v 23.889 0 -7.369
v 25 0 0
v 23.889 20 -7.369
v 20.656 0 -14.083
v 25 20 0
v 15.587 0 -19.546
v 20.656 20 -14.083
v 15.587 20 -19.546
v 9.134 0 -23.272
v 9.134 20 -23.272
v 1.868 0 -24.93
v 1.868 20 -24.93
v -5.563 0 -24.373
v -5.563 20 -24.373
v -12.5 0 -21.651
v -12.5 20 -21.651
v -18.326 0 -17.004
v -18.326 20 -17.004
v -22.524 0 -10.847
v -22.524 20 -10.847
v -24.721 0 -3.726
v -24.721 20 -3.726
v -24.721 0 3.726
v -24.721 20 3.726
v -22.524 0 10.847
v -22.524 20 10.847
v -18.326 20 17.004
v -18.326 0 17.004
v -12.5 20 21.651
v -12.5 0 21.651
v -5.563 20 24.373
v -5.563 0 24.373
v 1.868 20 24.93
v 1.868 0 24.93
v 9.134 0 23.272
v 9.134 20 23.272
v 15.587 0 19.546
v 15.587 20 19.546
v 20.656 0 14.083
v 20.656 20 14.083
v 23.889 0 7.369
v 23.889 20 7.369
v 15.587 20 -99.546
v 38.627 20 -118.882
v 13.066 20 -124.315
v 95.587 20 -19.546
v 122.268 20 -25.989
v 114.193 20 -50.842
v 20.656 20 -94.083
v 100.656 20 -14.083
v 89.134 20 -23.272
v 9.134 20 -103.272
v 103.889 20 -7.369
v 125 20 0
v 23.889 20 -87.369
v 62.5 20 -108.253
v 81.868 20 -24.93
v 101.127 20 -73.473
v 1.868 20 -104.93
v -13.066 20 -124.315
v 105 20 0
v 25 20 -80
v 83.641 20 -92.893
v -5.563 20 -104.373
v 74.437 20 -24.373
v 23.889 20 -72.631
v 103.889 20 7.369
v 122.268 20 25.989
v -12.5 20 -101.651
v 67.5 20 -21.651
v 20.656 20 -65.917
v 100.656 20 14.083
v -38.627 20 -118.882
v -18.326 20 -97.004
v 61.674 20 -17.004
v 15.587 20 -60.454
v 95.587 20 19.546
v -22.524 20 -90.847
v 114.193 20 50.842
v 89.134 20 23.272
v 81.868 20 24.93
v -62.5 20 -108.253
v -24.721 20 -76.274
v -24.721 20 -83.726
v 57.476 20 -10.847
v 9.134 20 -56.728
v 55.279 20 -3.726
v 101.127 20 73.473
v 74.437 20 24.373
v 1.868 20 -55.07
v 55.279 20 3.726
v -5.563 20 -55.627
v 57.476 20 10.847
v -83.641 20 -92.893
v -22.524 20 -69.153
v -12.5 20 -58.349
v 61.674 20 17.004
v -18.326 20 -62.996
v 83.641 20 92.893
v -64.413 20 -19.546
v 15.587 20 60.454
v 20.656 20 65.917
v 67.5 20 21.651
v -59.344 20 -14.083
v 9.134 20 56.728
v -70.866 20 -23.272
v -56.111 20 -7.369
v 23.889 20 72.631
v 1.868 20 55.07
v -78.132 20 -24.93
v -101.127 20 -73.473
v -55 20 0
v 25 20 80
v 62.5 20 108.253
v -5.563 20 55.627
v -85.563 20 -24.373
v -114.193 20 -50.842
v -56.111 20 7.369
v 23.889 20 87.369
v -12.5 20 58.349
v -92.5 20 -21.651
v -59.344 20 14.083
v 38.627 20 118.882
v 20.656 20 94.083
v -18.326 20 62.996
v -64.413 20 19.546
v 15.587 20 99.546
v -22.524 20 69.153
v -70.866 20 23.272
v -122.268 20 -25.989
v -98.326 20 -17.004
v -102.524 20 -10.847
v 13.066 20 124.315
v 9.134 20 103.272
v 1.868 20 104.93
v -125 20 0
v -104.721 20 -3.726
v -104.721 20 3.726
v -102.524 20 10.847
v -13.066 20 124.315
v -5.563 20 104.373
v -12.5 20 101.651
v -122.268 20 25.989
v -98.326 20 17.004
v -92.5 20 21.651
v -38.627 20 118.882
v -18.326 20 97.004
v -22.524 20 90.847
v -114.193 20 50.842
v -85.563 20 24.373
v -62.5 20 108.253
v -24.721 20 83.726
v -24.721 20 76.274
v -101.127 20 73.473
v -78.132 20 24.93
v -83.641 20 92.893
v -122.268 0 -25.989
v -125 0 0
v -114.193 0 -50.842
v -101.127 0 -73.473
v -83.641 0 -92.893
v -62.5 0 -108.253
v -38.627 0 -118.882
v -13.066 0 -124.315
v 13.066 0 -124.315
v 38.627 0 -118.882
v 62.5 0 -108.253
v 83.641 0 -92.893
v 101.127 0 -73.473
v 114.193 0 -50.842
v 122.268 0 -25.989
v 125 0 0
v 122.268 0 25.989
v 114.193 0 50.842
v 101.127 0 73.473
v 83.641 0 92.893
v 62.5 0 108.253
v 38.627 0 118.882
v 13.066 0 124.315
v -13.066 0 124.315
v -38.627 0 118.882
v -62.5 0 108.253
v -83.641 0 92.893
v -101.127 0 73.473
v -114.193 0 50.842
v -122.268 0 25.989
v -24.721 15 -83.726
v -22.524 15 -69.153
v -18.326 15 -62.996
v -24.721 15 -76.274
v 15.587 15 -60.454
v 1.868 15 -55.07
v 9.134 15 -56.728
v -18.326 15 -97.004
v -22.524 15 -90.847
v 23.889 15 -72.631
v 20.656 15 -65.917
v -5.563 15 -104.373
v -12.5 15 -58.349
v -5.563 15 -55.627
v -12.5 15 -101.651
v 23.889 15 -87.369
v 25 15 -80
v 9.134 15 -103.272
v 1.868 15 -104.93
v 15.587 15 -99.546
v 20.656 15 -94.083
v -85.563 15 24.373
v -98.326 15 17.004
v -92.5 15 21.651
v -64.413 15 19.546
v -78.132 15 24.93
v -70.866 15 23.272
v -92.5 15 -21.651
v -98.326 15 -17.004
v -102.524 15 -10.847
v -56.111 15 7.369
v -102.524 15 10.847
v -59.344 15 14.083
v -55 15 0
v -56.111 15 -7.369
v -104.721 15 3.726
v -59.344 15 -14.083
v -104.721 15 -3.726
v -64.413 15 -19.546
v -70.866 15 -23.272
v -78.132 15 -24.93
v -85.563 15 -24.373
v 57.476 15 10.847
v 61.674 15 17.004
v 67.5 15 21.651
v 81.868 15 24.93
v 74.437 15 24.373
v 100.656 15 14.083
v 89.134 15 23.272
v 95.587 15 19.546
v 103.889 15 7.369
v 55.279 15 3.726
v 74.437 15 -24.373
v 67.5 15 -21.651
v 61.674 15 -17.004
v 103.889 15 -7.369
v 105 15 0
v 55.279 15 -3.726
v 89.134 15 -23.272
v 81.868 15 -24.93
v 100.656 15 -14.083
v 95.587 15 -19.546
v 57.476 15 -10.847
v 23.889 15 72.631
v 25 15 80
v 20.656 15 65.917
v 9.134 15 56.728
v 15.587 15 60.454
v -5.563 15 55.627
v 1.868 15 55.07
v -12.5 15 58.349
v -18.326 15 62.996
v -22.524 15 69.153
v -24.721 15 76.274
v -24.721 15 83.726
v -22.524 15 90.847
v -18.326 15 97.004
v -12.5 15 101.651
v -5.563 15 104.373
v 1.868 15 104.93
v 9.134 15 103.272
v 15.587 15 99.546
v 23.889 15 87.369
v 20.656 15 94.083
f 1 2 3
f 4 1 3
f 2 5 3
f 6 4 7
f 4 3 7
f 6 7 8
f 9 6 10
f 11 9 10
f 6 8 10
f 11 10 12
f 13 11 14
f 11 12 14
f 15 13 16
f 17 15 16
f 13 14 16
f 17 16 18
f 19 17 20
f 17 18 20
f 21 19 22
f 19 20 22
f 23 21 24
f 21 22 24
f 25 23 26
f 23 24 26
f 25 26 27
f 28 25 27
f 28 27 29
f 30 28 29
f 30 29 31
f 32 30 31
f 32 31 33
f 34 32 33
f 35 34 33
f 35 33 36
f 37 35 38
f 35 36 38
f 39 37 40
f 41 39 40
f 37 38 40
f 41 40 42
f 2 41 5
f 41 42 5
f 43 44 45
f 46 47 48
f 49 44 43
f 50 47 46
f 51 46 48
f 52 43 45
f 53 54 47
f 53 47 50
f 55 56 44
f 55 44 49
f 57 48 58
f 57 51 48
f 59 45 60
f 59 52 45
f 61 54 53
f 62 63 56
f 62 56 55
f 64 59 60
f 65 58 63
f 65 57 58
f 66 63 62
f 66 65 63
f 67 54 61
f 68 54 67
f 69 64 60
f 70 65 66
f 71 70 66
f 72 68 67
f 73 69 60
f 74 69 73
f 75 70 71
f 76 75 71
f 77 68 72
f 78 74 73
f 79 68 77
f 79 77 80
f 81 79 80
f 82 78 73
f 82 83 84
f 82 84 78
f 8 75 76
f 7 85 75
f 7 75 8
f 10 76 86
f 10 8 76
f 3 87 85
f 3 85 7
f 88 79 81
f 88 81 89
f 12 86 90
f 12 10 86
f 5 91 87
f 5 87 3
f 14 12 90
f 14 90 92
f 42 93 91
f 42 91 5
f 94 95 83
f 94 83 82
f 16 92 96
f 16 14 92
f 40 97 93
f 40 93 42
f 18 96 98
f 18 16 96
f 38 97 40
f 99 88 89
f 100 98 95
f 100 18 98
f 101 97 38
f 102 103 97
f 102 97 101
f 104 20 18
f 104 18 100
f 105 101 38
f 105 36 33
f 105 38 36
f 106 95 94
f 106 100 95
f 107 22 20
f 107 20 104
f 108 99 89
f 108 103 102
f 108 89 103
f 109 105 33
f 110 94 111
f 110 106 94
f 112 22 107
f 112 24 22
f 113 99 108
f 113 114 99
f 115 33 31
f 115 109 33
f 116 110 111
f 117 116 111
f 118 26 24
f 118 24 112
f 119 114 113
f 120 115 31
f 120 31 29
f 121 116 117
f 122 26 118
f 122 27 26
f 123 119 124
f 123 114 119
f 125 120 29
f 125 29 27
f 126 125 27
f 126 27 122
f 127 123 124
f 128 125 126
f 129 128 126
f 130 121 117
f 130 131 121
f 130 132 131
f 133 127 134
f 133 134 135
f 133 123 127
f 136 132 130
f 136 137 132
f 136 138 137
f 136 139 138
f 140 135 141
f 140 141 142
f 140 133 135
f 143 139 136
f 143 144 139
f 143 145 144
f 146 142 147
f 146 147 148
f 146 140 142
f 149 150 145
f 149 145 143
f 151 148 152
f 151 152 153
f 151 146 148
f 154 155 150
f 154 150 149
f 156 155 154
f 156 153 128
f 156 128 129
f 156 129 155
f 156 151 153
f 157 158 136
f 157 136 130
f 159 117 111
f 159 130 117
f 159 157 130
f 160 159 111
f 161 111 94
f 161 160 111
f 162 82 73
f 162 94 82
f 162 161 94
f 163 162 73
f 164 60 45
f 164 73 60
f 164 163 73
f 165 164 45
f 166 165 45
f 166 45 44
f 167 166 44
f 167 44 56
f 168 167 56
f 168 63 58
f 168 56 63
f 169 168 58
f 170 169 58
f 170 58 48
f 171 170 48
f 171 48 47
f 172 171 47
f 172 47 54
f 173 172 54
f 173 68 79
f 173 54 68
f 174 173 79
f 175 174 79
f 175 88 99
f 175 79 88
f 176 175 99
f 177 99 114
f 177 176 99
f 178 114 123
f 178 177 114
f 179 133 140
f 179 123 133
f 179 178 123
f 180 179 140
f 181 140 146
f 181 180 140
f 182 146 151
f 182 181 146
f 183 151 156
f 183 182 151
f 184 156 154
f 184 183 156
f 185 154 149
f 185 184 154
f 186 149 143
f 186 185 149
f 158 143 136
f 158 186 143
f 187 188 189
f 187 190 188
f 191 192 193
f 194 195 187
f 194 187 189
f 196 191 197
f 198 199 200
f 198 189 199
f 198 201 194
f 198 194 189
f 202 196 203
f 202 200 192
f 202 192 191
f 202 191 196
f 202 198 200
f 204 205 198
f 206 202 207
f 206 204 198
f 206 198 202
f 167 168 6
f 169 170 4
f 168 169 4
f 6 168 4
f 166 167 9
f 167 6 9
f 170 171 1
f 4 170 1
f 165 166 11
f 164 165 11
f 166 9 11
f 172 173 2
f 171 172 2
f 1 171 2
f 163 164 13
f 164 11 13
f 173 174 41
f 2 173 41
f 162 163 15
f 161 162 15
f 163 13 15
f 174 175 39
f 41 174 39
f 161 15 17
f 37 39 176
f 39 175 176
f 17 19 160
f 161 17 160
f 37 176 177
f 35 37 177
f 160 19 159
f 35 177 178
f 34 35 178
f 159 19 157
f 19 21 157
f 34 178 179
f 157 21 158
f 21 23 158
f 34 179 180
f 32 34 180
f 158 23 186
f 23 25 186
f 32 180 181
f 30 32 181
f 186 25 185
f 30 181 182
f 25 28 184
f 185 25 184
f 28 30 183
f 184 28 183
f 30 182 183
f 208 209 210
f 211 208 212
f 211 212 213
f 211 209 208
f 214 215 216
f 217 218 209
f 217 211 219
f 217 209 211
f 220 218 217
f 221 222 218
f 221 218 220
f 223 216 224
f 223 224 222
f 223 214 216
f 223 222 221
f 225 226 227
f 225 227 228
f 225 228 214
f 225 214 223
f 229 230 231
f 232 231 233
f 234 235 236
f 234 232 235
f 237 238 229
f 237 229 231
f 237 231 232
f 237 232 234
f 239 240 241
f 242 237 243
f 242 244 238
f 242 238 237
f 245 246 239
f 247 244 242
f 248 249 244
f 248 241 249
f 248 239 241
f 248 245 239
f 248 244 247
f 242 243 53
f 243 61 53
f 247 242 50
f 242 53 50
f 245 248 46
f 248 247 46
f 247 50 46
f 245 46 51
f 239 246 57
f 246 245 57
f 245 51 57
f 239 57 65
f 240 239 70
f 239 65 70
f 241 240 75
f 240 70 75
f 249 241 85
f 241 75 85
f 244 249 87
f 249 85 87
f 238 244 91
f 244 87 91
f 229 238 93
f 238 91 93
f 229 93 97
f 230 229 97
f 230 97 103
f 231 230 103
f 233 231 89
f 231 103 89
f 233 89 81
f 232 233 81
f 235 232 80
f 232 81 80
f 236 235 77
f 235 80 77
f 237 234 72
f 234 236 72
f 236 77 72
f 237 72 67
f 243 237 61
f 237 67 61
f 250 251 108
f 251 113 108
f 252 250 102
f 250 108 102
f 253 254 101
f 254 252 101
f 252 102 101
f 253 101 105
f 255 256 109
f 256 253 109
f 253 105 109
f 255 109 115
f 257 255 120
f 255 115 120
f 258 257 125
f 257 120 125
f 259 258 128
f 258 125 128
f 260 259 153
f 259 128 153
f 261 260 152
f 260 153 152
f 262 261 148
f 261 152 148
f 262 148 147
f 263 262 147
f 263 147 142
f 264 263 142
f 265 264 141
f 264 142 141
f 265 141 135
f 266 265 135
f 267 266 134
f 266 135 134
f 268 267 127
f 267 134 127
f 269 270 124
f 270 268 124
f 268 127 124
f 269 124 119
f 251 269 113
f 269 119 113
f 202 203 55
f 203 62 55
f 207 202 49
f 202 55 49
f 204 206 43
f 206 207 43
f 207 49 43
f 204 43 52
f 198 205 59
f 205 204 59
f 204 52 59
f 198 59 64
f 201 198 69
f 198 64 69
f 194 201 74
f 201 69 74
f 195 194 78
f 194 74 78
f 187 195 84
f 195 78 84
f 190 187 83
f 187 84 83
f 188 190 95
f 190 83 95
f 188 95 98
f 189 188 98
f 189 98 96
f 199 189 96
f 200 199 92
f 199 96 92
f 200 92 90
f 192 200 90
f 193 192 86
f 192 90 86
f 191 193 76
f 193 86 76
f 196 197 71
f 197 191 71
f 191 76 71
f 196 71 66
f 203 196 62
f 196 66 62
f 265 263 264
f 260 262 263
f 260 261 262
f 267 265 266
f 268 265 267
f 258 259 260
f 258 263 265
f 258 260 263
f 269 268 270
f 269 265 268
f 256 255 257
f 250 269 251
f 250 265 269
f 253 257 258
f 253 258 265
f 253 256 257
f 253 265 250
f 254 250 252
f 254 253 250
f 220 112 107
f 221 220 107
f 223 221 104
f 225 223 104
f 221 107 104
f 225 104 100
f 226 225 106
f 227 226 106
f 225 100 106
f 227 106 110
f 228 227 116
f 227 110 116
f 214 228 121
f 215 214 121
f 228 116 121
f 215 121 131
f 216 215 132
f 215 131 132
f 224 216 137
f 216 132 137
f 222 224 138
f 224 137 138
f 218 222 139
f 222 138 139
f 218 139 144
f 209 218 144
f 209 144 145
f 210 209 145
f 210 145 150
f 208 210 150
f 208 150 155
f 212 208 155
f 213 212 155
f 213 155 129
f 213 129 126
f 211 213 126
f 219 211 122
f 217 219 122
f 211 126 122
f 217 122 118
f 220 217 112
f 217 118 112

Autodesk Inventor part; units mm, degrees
ref_plane "YZ Plane" through (0, 0, 0) normal (1, 0, 0) x (0, 1, 0)
ref_plane "XZ Plane" through (0, 0, 0) normal (0, 1, 0) x (-1, 0, 0)
ref_plane "XY Plane" through (0, 0, 0) normal (0, 0, 1) x (1, 0, 0)
sketch "Sketch1" plane through (0, 0, 0) normal (0, 1, 0) x (-1, 0, 0)
  point P0 (0, 0)
extrude "Extrusion1" [suppressed]
sketch "Sketch2" plane through (0, 0, 0) normal (0, 1, 0) x (-1, 0, 0)
  circle A0 centre (0, 0) radius 125
  dimension "d3" = 250
extrude "Extrusion2" add sketch "Sketch2" along normal blind 20
sketch "Sketch3" plane through (0, 20, 0) normal (0, 1, 0) x (1, 0, 0)
  circle A0 centre (0, 0) radius 25
  dimension "d6" = 50
extrude "Extrusion3" cut sketch "Sketch3" against normal blind 20
sketch "Sketch4" plane through (0, 20, 0) normal (0, 1, 0) x (1, 0, 0)
  line L0 (0, 0) -> (0, 80)
  circle A0 centre (0, 80) radius 25
  dimension "d9" = 80
  dimension "d10" = 50
extrude "Extrusion4" cut sketch "Sketch4" against normal blind 5
sketch "Sketch5" plane through (0, 20, 0) normal (0, 1, 0) x (1, 0, 0)
  line L0 (0, 0) -> (80, 0)
  circle A0 centre (80, 0) radius 25
  dimension "d13" = 80
  dimension "d14" = 50
extrude "Extrusion5" cut sketch "Sketch5" against normal blind 5
sketch "Sketch6" plane through (0, 20, 0) normal (0, 1, 0) x (1, 0, 0)
  line L0 (0, 0) -> (-80, 0)
  circle A0 centre (-80, 0) radius 25
  dimension "d17" = 80
  dimension "d18" = 50
extrude "Extrusion6" cut sketch "Sketch6" against normal blind 5
sketch "Sketch7" plane through (0, 20, 0) normal (0, 1, 0) x (1, 0, 0)
  line L0 (0, 0) -> (0, -80)
  circle A0 centre (0, -80) radius 25
  dimension "d21" = 80
  dimension "d22" = 50
extrude "Extrusion7" cut sketch "Sketch7" against normal blind 5
properties part number "expo12"
